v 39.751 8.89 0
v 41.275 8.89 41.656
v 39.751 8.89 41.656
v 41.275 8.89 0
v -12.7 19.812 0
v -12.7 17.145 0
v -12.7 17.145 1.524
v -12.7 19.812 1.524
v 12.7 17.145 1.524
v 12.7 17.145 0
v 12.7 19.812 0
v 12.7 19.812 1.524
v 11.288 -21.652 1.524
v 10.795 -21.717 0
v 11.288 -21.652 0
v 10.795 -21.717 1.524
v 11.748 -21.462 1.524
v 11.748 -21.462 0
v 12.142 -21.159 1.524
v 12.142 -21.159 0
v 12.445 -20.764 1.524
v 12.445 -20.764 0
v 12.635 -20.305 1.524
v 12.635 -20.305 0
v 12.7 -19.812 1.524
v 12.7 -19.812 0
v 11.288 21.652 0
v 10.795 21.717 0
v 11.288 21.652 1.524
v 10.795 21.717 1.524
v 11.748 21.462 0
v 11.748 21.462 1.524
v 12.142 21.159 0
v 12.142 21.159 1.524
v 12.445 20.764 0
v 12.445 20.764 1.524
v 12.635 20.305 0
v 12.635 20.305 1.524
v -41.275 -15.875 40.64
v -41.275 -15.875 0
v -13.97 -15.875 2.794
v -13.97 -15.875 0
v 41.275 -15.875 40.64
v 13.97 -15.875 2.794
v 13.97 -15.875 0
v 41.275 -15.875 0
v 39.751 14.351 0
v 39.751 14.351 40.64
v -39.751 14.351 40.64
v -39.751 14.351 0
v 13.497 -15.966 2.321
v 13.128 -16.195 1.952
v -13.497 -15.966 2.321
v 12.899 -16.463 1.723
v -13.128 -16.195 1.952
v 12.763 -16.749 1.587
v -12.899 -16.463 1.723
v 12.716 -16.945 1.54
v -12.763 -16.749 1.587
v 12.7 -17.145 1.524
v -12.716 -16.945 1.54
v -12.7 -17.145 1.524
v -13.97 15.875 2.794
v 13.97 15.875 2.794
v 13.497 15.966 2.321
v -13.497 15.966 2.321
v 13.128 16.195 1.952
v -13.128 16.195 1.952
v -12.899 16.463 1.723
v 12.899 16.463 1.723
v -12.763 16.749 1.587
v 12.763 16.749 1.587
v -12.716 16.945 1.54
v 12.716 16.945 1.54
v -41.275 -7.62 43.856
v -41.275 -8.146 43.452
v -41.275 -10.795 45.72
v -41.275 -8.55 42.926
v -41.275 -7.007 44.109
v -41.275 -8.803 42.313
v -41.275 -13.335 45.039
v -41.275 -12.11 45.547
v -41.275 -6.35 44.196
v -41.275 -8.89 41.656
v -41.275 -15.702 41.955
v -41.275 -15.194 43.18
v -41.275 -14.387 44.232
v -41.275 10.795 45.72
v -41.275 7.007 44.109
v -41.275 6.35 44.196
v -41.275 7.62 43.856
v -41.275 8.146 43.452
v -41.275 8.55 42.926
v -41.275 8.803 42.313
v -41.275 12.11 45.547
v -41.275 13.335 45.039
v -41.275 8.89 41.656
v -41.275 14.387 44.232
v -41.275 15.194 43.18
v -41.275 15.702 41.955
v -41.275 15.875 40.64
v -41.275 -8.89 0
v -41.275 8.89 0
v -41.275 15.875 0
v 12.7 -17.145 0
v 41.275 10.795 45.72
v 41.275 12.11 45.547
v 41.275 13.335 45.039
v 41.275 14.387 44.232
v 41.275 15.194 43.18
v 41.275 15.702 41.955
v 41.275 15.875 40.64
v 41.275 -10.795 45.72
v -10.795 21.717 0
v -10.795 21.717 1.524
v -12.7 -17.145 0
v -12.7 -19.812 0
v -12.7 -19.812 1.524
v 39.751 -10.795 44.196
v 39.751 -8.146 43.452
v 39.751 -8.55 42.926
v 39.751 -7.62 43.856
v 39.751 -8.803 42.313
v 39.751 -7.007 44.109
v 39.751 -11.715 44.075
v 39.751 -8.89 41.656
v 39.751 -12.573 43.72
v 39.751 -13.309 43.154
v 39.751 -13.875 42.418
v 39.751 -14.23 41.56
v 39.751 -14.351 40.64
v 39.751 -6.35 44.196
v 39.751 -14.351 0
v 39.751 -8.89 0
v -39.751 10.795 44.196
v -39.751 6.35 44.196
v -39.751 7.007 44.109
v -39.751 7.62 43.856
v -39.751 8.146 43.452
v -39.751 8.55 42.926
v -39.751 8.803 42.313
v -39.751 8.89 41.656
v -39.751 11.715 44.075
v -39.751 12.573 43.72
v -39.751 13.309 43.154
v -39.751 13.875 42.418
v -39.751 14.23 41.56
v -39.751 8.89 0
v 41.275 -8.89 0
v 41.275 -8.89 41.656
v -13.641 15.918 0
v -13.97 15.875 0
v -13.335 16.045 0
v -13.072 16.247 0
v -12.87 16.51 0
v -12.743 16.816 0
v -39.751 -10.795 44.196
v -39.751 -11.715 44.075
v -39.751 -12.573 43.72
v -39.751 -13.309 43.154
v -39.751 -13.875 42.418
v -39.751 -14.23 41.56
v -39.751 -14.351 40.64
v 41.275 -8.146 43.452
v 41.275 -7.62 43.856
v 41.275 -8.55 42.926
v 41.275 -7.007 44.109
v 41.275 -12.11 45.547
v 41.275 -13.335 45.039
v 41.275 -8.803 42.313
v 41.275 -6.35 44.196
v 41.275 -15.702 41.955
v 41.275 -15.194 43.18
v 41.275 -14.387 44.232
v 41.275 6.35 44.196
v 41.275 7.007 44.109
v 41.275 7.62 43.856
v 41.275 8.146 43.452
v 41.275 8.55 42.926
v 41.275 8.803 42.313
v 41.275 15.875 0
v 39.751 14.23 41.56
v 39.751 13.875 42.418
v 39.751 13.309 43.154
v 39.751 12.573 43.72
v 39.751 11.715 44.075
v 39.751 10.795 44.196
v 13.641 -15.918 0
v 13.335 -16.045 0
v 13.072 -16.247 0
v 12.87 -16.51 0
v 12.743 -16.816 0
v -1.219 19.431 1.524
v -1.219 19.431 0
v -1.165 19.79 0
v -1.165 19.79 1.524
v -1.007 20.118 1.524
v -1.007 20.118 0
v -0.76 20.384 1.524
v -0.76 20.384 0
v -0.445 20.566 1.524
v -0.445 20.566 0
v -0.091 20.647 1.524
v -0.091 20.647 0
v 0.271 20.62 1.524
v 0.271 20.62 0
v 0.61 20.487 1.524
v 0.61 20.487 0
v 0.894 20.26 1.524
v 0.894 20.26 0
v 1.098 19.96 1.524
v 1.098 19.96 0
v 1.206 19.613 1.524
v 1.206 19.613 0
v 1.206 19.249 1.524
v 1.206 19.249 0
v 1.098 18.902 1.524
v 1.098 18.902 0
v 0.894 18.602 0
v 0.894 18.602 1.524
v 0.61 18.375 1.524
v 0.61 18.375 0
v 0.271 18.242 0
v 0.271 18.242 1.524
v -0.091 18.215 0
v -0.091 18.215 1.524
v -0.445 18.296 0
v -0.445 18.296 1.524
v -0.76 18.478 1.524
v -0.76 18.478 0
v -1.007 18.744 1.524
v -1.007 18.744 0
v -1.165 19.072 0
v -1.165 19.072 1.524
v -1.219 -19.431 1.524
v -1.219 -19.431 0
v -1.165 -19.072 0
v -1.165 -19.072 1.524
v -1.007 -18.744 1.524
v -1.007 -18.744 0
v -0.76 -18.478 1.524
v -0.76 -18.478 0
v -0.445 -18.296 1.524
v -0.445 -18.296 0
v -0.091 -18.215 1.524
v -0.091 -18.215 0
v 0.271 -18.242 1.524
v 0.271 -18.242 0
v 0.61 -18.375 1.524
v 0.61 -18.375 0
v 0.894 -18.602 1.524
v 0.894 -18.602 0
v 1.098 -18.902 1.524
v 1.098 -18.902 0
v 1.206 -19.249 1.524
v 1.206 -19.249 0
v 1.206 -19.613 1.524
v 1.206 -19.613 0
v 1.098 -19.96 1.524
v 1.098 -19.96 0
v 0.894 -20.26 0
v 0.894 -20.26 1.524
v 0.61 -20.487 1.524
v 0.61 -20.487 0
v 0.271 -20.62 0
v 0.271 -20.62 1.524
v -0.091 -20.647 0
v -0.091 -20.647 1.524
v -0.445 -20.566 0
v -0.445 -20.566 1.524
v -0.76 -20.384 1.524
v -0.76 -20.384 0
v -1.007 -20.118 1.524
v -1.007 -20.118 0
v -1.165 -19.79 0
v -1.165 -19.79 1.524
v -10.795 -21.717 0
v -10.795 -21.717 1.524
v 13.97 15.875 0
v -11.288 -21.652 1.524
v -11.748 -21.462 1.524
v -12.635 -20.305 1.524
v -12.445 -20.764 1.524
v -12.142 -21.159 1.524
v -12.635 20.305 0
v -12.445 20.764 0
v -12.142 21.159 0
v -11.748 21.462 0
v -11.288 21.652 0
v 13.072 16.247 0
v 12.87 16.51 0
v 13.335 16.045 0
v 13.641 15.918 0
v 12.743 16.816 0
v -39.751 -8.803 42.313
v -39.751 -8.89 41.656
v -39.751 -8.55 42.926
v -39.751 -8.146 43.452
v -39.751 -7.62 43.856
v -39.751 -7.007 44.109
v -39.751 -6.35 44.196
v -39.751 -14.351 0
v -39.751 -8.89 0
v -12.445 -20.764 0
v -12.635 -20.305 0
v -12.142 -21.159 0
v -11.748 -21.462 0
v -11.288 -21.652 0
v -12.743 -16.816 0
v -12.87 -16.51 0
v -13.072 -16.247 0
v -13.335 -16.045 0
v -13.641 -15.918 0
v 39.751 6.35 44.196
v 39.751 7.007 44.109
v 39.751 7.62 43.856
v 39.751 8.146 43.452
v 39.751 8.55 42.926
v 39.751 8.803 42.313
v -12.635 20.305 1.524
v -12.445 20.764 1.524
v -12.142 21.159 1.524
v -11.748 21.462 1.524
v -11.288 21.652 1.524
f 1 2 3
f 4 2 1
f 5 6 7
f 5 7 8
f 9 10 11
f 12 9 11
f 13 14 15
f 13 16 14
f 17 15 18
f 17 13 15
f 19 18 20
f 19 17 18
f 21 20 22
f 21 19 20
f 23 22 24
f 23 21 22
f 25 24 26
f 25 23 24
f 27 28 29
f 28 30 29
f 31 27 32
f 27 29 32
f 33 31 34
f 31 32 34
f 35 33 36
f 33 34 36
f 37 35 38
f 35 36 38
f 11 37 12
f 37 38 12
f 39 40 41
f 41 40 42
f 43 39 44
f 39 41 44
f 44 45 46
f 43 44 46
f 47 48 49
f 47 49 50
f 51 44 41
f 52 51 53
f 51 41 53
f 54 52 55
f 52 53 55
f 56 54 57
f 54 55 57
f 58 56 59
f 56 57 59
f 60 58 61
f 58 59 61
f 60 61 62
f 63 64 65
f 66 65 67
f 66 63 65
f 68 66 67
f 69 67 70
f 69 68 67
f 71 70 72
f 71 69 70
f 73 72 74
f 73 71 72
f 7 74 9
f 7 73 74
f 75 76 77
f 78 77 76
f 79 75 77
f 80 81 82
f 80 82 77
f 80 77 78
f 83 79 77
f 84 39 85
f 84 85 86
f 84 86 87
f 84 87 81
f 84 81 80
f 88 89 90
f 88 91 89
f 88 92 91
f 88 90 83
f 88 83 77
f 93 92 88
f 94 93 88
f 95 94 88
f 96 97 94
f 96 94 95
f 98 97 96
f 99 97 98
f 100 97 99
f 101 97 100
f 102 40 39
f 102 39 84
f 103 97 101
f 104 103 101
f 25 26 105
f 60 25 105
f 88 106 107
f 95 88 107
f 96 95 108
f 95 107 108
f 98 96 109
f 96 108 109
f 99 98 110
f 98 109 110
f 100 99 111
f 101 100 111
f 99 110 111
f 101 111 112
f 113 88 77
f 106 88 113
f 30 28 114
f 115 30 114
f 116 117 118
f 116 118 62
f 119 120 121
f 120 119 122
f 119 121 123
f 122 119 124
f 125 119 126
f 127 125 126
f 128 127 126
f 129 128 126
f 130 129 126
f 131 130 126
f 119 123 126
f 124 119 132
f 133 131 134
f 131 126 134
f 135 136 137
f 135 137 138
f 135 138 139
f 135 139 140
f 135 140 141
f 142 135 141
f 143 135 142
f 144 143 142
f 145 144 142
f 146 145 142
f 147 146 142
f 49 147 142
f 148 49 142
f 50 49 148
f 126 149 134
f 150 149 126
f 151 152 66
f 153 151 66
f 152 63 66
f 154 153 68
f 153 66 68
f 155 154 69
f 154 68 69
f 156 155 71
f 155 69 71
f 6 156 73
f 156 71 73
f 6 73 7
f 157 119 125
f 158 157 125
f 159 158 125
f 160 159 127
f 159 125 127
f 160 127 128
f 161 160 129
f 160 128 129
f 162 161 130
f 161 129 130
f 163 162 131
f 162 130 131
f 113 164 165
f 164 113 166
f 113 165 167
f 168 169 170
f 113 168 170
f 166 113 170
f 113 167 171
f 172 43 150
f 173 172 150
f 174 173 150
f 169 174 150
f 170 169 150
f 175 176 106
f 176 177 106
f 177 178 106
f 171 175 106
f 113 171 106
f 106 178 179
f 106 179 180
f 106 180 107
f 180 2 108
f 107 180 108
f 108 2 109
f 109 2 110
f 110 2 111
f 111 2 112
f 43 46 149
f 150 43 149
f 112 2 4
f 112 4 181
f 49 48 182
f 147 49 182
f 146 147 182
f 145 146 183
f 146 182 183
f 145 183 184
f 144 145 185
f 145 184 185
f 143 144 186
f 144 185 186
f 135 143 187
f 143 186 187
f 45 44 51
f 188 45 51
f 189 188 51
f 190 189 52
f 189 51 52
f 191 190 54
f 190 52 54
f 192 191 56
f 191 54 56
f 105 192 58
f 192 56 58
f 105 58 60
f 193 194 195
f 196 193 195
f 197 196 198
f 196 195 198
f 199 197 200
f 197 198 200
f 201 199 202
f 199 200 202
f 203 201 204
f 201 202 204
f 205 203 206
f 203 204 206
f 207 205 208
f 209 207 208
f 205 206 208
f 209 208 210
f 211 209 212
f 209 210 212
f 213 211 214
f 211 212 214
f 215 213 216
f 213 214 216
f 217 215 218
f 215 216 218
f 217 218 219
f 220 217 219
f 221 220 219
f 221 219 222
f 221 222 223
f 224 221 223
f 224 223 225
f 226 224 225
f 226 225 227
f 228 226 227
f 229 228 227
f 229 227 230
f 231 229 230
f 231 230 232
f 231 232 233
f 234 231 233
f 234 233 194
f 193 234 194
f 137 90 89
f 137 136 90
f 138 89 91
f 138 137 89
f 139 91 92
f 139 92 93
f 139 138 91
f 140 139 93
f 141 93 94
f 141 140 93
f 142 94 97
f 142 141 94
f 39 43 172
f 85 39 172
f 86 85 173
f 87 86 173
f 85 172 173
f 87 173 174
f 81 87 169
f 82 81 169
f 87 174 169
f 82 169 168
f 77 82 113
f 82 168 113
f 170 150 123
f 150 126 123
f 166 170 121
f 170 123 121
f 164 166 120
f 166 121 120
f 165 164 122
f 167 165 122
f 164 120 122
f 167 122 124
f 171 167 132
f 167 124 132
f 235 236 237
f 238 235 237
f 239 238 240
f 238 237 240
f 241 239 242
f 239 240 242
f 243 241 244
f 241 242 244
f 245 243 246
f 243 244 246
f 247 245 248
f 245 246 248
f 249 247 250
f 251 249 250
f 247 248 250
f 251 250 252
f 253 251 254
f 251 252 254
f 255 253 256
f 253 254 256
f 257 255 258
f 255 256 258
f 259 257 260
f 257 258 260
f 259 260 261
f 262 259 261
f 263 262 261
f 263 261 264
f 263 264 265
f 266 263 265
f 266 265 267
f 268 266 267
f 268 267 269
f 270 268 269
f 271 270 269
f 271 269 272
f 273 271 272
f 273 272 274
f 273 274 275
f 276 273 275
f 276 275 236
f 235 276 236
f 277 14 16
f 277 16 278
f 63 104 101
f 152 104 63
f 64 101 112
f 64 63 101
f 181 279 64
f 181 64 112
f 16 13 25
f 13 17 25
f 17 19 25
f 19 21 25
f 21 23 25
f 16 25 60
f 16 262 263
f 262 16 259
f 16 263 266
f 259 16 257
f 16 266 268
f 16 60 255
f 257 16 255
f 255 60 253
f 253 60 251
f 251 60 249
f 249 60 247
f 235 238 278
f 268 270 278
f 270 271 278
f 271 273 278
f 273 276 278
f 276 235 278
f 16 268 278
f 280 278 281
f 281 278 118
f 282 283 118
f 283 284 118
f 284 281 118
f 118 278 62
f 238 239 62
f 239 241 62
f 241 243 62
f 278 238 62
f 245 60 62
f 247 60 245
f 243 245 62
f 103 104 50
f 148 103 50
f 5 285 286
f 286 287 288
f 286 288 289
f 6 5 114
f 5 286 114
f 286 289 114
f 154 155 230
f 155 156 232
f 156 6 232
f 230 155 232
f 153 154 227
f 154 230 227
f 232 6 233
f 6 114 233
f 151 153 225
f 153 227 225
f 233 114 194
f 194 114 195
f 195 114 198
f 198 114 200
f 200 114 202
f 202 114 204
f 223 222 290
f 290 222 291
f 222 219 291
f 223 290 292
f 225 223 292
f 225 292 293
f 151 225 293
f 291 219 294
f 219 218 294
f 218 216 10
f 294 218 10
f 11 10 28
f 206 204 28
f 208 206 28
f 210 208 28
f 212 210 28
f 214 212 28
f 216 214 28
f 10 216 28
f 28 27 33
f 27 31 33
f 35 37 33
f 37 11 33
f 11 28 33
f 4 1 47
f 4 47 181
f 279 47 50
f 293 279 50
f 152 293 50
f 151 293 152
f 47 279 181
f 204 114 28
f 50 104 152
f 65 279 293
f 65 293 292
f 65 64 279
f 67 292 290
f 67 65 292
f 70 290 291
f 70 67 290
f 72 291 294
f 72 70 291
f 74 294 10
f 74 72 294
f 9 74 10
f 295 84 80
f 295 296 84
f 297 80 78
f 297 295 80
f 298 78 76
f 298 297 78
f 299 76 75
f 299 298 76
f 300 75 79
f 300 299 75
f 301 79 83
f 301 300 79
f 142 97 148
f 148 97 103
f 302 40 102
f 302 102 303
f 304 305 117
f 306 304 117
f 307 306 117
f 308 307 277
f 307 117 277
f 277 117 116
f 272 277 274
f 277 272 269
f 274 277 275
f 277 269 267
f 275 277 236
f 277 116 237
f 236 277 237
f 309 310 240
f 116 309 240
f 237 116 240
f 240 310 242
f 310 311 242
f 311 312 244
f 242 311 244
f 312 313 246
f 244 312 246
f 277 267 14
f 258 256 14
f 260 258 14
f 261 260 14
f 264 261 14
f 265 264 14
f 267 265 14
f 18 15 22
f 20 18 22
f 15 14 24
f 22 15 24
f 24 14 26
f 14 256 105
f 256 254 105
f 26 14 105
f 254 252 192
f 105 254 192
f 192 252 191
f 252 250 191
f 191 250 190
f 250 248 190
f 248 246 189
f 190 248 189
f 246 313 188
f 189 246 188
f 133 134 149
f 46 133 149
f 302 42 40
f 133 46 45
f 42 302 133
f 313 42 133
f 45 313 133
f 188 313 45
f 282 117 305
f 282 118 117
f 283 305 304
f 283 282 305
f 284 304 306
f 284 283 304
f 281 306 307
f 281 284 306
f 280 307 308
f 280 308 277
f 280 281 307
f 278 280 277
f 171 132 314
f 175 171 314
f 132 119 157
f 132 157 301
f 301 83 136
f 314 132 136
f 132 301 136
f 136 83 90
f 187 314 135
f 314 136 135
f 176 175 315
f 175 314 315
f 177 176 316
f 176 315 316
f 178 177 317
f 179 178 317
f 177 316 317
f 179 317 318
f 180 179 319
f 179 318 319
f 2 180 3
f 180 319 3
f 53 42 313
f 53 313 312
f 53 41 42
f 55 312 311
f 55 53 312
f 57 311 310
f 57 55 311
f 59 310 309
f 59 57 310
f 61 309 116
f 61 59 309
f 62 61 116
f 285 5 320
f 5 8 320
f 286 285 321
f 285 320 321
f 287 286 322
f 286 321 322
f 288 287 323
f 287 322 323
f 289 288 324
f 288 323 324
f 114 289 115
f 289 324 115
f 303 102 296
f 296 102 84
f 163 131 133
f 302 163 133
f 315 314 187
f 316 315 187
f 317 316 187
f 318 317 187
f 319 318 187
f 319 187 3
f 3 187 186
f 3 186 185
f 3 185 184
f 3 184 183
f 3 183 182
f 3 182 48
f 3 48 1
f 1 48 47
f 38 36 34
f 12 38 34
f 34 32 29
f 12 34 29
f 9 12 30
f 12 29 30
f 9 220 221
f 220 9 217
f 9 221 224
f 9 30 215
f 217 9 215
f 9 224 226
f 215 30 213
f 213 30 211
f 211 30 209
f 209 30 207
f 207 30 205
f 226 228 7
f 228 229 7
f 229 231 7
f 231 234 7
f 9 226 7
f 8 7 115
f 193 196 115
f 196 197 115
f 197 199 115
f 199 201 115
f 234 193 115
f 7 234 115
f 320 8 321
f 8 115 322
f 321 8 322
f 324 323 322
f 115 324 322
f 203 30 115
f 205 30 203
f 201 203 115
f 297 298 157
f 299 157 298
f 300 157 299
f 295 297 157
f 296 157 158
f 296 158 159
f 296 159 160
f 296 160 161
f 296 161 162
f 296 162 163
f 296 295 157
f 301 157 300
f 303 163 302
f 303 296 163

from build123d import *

# Parameters (mm, degrees)
SKETCH1_W               = 82.55
SKETCH1_H               = 31.75
BOSS_EXTRUDE1_DEPTH     = 45.72
SHELL1_T                = -1.524
SKETCH3_W               = 25.4
SKETCH3_H               = 5.842
BOSS_EXTRUDE3_DEPTH     = 1.524
FILLET2_R               = 1.27
FILLET3_R               = 1.905
F_2_CLEARANCE_HOLE1_D   = 2.4384
SKETCH6_W               = 44.196
SKETCH6_H               = 28.702
CUT_EXTRUDE1_DEPTH      = 82.026
CUT_EXTRUDE1_DEPTH_BACK = 2.524
FILLET4_R               = 3.556
FILLET5_R               = 5.08
BOSS_EXTRUDE4_DEPTH     = 1.524
FILLET9_R               = 2.54
FILLET10_R              = 2.54


with BuildPart() as part:
    # Sketch1 → Boss-Extrude1 (new body)
    with BuildSketch(Plane.XY):
        Rectangle(SKETCH1_W, SKETCH1_H)
    extrude(amount=BOSS_EXTRUDE1_DEPTH)

    # Shell1
    shell1_openings = [part.faces().sort_by_distance(p)[0] for p in [
        (0, 0, 0),
    ]]
    offset(amount=SHELL1_T, openings=shell1_openings, kind=Kind.INTERSECTION)

    # Sketch3 → Boss-Extrude3 (add)
    with BuildSketch(Plane(origin=(0, 0, 0), x_dir=(-1, 0, 0), z_dir=(0, 0, -1))):
        with Locations((0, 18.796)):
            Rectangle(SKETCH3_W, SKETCH3_H)
        with Locations((0, -18.796)):
            Rectangle(SKETCH3_W, SKETCH3_H)
    extrude(amount=-BOSS_EXTRUDE3_DEPTH)

    # Fillet2
    fillet2_edges = [part.edges().sort_by_distance(p)[0] for p in [
        (12.7, 15.875, 0.762),
        (0, 15.875, 1.524),
        (-12.7, 15.875, 0.762),
        (0, -15.875, 1.524),
        (12.7, -15.875, 0.762),
        (-12.7, -15.875, 0.762),
    ]]
    fillet(fillet2_edges, radius=FILLET2_R)

    # Fillet3
    fillet3_edges = [part.edges().sort_by_distance(p)[0] for p in [
        (12.7, 21.717, 0.762),
        (-12.7, 21.717, 0.762),
        (12.7, -21.717, 0.762),
        (-12.7, -21.717, 0.762),
    ]]
    fillet(fillet3_edges, radius=FILLET3_R)

    # #2 Clearance Hole1 (through all)
    with Locations(Plane.XY.offset(1.524)):
        with Locations((0, 19.431), (0, -19.431)):
            Hole(F_2_CLEARANCE_HOLE1_D / 2)

    # Sketch6 → Cut-Extrude1 (cut, two sides)
    with BuildSketch(Plane(origin=(-39.751, 0, 0), x_dir=(0, 0, -1), z_dir=(1, 0, 0))) as cut_extrude1_sk:
        with Locations((-22.098, 0)):
            Rectangle(SKETCH6_W, SKETCH6_H)
    extrude(amount=CUT_EXTRUDE1_DEPTH, mode=Mode.SUBTRACT)
    extrude(cut_extrude1_sk.sketch, amount=-CUT_EXTRUDE1_DEPTH_BACK, mode=Mode.SUBTRACT)

    # Fillet4
    fillet4_edges = [part.edges().sort_by_distance(p)[0] for p in [
        (0, -14.351, 44.196),
        (0, 14.351, 44.196),
    ]]
    fillet(fillet4_edges, radius=FILLET4_R)

    # Fillet5
    fillet5_edges = [part.edges().sort_by_distance(p)[0] for p in [
        (0, 15.875, 45.72),
        (0, -15.875, 45.72),
    ]]
    fillet(fillet5_edges, radius=FILLET5_R)

    # Sketch7 → Boss-Extrude4 (add)
    with BuildSketch(Plane(origin=(41.275, 0, 0), x_dir=(0, 0, -1), z_dir=(1, 0, 0))):
        with BuildLine():
            Line((-45.72, 10.795), (-45.72, -10.795))
            ThreePointArc((-45.72, -10.795), (-44.232102448, -14.387102448), (-40.64, -15.875))
            Line((-40.64, -15.875), (0, -15.875))
            Line((0, -15.875), (0, -8.89))
            Line((0, -8.89), (-44.196, -8.89))
            Line((-44.196, -8.89), (-44.196, 8.89))
            Line((-44.196, 8.89), (0, 8.89))
            Line((0, 8.89), (0, 15.875))
            Line((0, 15.875), (-40.64, 15.875))
            ThreePointArc((-40.64, 15.875), (-44.232102448, 14.387102448), (-45.72, 10.795))
        make_face()
    boss_extrude4 = extrude(amount=-BOSS_EXTRUDE4_DEPTH)

    # Fillet9
    fillet9_edges = [part.edges().sort_by_distance(p)[0] for p in [
        (40.513, 8.89, 44.196),
        (40.513, -8.89, 44.196),
    ]]
    fillet(fillet9_edges, radius=FILLET9_R)

    # Mirror1: Boss-Extrude4 across plane
    add(boss_extrude4.mirror(Plane(origin=(0, 0, 0), x_dir=(0, 0, 1), z_dir=(1, 0, 0))))

    # Fillet10
    fillet10_edges = [part.edges().sort_by_distance(p)[0] for p in [
        (-40.513, -8.89, 44.196),
        (-40.513, 8.89, 44.196),
    ]]
    fillet(fillet10_edges, radius=FILLET10_R)


solid = part.part
